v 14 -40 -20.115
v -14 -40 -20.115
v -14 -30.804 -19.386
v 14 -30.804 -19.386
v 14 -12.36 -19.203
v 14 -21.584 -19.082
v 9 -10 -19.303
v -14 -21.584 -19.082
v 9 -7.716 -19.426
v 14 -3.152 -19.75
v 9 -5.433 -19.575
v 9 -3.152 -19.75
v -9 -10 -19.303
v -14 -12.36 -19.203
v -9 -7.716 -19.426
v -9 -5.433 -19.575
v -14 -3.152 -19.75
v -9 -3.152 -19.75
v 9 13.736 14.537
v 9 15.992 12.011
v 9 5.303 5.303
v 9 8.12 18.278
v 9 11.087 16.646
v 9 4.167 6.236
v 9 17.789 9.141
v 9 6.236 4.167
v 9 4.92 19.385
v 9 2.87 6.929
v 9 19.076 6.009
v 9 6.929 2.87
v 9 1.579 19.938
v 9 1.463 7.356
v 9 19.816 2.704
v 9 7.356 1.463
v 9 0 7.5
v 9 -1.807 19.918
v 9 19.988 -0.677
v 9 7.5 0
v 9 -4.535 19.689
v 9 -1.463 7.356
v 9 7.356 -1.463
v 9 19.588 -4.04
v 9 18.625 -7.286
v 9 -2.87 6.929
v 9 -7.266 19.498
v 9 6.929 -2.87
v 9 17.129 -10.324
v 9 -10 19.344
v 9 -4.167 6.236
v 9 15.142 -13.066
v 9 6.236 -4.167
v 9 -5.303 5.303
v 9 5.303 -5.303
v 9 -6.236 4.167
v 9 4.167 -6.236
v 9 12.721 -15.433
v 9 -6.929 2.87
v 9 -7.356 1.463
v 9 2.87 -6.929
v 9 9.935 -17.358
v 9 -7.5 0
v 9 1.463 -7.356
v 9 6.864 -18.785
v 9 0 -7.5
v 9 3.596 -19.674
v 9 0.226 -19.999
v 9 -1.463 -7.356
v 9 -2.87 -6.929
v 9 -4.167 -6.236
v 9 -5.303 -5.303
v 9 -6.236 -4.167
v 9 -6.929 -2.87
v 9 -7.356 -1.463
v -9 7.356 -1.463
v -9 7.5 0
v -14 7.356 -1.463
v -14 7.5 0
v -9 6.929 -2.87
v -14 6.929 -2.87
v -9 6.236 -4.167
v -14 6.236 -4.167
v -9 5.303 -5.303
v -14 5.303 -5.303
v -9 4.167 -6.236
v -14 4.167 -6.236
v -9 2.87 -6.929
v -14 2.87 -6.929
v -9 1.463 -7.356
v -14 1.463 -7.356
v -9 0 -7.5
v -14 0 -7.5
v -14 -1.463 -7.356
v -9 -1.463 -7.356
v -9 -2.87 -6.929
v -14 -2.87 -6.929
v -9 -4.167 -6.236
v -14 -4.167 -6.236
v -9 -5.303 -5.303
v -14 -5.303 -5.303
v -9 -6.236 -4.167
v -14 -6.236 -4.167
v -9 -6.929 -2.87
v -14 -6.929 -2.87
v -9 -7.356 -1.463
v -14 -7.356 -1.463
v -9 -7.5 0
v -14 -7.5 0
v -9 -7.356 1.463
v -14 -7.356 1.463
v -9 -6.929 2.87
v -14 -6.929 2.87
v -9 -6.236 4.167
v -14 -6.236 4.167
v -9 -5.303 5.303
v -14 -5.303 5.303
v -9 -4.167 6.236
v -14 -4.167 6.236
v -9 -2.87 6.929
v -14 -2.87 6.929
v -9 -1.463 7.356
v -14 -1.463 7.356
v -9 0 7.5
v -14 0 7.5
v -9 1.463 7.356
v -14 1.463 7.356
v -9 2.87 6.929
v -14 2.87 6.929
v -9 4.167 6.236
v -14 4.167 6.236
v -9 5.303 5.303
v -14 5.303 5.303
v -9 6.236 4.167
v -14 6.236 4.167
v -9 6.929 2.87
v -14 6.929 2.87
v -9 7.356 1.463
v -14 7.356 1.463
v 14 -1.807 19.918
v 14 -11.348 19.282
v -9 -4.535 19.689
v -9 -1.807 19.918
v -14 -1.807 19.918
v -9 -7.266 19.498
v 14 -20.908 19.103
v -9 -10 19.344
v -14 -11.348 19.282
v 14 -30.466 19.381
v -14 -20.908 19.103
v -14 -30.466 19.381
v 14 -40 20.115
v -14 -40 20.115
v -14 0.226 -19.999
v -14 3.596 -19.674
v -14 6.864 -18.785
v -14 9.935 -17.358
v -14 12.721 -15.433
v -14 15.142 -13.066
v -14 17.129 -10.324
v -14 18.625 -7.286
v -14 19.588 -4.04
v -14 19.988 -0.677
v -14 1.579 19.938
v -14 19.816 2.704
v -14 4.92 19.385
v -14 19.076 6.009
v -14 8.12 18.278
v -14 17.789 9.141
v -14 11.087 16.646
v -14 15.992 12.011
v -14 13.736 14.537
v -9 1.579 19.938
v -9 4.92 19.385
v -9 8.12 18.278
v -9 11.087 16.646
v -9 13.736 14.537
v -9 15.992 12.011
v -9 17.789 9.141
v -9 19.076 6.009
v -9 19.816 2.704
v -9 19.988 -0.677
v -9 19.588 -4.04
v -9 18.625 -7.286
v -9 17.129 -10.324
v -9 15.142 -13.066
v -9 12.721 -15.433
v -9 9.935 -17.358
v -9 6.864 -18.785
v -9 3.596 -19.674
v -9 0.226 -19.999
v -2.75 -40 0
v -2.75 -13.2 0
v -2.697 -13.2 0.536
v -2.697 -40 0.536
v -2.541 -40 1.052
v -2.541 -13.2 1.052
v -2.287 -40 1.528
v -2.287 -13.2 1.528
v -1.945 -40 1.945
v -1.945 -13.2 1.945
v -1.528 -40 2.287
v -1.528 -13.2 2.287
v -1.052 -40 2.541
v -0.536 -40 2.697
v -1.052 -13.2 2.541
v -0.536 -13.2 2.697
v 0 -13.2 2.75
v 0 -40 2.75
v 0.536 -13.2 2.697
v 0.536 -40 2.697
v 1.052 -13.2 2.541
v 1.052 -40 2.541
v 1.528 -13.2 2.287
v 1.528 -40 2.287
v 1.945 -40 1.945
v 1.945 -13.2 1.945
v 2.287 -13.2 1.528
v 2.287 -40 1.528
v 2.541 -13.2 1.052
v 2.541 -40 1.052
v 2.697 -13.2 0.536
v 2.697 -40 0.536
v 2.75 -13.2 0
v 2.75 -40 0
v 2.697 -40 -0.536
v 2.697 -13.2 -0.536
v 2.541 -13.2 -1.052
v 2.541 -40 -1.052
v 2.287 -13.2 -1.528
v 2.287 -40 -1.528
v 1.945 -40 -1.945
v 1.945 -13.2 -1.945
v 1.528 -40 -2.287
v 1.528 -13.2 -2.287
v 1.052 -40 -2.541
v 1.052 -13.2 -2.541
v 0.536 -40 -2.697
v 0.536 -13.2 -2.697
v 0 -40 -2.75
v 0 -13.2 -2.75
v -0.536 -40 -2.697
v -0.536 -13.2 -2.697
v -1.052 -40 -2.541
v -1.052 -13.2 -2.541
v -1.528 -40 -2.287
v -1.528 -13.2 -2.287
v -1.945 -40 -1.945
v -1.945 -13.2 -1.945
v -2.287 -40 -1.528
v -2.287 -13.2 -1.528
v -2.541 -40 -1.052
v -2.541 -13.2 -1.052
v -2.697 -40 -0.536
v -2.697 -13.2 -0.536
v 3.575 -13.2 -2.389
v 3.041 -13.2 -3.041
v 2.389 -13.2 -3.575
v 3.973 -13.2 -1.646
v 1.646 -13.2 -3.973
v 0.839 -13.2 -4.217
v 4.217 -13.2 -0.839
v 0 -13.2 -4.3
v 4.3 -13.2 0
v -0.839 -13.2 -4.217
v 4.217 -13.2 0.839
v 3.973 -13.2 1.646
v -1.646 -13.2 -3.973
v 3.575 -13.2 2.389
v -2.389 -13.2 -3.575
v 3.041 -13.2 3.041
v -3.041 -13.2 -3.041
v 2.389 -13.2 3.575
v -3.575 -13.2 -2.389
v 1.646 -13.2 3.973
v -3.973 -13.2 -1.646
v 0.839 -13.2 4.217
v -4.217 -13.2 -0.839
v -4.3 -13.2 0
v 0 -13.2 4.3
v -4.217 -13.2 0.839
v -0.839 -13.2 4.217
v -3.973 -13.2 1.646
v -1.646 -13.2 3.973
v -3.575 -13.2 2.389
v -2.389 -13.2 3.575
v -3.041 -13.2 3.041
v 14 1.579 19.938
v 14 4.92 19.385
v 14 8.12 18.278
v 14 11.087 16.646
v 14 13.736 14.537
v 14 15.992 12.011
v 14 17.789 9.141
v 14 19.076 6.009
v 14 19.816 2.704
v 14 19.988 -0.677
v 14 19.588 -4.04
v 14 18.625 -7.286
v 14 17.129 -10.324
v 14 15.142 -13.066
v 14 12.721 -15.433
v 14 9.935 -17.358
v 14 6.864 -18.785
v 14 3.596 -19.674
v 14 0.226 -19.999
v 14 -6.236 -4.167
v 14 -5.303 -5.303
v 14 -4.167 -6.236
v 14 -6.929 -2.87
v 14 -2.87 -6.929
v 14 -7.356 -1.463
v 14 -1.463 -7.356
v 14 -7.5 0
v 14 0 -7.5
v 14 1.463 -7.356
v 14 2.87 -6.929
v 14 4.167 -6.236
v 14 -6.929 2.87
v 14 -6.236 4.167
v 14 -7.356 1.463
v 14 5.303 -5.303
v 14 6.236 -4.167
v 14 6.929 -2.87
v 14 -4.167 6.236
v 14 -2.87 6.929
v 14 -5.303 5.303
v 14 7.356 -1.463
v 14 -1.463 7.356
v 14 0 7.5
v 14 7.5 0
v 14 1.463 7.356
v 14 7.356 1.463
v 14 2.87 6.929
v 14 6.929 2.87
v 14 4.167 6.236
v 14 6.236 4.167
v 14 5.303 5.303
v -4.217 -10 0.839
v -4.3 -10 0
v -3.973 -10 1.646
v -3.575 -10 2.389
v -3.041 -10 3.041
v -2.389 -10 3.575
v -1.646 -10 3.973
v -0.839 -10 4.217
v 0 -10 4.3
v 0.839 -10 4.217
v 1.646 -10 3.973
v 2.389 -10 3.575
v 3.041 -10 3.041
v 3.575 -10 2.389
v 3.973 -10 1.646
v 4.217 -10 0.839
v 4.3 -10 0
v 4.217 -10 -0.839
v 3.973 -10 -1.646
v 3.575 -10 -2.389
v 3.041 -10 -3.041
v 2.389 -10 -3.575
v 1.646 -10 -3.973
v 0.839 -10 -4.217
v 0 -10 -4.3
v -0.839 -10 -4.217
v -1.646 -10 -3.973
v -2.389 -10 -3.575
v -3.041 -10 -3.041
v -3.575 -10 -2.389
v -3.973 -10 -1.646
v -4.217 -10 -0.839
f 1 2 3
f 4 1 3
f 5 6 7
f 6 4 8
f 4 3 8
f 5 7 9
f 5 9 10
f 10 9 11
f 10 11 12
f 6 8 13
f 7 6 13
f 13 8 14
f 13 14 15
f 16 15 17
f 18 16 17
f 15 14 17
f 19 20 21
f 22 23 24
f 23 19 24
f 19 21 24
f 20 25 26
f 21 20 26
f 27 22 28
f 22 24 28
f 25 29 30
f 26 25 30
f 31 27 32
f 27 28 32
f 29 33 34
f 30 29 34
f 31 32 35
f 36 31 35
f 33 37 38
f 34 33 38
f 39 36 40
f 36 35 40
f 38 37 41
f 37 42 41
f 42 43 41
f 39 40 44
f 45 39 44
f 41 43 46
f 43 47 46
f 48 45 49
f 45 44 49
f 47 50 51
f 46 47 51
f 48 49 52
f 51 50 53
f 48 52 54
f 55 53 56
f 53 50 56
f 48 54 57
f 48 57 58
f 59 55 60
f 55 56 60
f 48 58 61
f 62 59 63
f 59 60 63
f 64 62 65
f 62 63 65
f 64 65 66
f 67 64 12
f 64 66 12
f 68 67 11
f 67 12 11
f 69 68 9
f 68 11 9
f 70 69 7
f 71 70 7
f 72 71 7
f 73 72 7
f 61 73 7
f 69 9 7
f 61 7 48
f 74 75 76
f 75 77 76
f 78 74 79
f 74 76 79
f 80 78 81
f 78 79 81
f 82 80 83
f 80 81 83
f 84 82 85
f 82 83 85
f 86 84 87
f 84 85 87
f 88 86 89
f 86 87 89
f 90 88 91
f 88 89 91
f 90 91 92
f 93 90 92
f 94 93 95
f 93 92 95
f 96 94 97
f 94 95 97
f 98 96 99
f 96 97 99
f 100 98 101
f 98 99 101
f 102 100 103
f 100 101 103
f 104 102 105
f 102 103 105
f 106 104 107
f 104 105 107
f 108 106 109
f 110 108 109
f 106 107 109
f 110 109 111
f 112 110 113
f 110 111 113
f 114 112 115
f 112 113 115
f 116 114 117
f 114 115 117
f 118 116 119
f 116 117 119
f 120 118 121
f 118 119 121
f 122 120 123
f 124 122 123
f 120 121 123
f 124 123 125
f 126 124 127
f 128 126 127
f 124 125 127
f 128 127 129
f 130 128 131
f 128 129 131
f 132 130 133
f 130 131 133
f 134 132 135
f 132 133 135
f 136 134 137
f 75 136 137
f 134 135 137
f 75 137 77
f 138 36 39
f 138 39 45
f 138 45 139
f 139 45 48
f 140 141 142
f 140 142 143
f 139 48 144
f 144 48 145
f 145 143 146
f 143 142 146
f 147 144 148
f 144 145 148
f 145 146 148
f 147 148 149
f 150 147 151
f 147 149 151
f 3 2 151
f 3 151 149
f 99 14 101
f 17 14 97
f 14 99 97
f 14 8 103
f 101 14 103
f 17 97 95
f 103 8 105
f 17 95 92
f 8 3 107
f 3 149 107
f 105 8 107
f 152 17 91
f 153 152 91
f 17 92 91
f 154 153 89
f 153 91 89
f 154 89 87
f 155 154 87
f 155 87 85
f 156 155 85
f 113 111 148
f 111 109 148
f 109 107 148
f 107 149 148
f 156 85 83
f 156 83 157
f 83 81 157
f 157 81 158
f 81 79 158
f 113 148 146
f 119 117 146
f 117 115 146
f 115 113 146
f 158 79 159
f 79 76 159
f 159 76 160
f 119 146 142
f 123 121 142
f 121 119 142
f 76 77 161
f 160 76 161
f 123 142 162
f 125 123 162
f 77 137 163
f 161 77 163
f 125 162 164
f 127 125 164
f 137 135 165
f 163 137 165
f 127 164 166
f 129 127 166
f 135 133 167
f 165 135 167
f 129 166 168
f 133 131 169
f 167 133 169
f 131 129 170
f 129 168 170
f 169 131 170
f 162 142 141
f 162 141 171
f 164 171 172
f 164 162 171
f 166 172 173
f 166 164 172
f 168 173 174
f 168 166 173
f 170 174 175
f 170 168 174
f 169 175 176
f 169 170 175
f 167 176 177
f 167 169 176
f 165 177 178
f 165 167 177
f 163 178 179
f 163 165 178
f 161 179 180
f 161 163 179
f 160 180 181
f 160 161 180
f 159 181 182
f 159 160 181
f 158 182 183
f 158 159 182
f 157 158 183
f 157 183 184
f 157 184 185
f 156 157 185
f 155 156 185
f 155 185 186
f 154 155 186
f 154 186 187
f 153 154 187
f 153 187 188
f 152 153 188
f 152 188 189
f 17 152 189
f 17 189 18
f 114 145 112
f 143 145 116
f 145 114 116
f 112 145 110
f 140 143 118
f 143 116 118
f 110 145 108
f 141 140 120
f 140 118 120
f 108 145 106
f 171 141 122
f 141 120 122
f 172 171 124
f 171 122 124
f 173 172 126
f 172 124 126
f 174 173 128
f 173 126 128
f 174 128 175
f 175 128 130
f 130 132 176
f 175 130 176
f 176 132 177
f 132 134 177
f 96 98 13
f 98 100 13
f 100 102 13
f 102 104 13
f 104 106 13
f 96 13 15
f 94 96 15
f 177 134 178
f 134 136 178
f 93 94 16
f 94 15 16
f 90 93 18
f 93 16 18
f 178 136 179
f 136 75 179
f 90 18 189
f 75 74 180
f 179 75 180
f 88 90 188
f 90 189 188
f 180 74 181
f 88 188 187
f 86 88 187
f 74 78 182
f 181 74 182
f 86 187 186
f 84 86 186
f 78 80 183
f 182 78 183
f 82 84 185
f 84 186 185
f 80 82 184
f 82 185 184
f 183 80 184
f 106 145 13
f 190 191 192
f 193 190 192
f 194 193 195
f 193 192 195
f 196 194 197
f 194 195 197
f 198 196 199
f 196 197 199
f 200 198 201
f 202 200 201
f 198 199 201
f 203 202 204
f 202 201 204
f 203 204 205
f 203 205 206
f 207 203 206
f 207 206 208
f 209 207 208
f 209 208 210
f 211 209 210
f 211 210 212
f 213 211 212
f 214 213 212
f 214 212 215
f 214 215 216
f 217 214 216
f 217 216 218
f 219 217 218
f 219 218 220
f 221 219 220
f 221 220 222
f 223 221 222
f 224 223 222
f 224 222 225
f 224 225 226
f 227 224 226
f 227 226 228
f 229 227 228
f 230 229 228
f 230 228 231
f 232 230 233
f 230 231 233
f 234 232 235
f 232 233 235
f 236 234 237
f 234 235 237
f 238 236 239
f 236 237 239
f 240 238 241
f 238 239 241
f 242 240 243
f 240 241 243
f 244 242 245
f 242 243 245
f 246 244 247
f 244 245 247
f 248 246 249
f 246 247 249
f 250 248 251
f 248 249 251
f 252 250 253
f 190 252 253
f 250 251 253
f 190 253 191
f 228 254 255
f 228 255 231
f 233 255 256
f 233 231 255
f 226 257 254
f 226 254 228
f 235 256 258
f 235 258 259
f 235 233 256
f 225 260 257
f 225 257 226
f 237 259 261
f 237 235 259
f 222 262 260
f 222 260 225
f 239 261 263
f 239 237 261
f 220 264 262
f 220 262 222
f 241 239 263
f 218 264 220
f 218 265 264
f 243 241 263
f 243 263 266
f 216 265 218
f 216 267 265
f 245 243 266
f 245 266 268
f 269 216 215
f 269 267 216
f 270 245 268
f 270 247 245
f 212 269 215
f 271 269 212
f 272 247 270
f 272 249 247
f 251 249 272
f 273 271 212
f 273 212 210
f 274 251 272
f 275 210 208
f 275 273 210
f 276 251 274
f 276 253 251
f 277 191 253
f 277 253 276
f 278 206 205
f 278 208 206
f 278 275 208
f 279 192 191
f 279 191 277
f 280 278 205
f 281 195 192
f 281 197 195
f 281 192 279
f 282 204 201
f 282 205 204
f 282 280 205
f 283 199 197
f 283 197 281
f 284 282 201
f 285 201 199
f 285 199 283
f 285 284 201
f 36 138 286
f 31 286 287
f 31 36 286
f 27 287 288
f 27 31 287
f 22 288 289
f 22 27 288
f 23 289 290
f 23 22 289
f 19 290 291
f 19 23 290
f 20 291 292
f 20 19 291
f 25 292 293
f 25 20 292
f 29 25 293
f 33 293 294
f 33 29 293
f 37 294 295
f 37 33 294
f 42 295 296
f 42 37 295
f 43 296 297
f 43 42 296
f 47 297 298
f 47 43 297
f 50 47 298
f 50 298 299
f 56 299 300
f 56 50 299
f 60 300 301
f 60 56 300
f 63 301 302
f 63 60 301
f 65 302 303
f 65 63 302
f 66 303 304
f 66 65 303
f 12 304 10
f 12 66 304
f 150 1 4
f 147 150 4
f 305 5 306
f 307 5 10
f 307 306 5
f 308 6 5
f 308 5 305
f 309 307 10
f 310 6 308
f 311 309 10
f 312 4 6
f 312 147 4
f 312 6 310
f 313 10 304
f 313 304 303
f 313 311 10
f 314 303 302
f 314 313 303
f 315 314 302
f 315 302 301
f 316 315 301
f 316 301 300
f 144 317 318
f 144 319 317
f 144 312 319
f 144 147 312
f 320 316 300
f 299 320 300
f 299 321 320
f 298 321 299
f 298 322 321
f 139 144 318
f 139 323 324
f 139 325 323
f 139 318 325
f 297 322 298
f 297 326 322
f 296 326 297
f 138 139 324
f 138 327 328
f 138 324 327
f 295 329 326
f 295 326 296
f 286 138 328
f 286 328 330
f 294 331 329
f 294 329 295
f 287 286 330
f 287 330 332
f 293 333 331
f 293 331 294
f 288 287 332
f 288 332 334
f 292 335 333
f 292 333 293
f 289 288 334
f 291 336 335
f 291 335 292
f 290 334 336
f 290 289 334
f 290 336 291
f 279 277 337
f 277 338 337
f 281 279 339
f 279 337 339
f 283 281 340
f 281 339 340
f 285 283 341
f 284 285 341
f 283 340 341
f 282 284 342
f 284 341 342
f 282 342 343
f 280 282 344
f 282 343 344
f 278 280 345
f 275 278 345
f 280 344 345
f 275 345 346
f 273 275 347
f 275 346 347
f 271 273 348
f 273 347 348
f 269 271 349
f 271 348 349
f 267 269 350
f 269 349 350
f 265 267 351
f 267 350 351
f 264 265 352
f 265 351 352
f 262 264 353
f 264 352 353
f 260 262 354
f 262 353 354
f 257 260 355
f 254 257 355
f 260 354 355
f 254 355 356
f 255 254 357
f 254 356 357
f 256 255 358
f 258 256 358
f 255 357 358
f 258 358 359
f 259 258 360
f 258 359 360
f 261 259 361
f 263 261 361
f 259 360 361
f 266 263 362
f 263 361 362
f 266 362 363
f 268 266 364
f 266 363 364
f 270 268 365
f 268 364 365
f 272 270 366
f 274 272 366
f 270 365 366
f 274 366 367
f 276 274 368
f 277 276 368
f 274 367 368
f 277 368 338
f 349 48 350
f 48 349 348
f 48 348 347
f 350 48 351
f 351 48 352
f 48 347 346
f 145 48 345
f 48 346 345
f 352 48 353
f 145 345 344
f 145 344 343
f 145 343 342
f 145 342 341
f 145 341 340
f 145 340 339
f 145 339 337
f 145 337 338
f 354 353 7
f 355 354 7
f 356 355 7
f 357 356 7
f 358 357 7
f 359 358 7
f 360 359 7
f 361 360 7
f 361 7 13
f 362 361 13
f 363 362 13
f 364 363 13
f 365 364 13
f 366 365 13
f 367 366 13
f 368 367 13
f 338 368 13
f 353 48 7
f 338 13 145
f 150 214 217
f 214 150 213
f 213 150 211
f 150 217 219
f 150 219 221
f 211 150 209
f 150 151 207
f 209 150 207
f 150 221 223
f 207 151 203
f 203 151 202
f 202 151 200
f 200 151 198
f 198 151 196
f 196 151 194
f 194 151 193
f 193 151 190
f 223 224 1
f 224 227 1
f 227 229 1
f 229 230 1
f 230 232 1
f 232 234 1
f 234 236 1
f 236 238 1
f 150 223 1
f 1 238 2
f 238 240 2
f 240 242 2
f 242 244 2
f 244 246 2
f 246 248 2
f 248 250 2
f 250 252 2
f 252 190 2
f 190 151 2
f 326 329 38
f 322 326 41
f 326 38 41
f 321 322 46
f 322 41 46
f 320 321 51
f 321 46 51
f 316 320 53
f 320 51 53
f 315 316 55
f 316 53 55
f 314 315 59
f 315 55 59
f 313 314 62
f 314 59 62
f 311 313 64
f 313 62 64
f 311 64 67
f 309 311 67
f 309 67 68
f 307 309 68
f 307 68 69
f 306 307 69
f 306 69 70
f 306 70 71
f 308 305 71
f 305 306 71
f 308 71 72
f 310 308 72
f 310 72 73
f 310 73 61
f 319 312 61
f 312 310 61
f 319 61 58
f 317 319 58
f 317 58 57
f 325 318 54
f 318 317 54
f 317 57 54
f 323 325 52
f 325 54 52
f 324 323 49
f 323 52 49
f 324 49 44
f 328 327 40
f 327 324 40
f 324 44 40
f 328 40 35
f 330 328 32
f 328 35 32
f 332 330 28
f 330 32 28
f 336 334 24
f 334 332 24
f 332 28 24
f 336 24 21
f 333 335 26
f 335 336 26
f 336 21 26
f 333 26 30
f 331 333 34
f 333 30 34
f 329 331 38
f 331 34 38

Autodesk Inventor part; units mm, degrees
ref_plane "YZ Plane" through (0, 0, 0) normal (1, 0, 0) x (0, 1, 0)
ref_plane "XY Plane" through (0, 0, 0) normal (0, 0, 1) x (1, 0, 0)
sketch "Sketch1" plane through (0, 0, 0) normal (1, 0, 0) x (0, 1, 0)
  circle A0 centre (0, 0) radius 7.5
  arc A1 (-3.1515, -19.7501) -> (-1.8071, 19.9182) centre (0, 0) ccw
  line L0 (-40, 20.115) -> (-40, -20.115)
  arc A2 (-40, 20.115) -> (-1.8071, 19.9182) centre (-19.8777, 219.1002) ccw
  arc A3 (-3.1515, -19.7501) -> (-40, -20.115) centre (-19.6039, -219.0723) ccw
  point P0 (-40, 0)
  dimension "d6" = 15
  dimension "d7" = 40
  dimension "d30" = 40.23
  dimension "d31" = 40
  dimension "d32" = 200
  dimension "d33" = 200
  dimension "d34" = 438.1724
  dimension "d35" = 219.0723
extrude "Extrusion1" add sketch "Sketch1" along normal mid plane 28
sketch "Sketch3" plane through (0, 0, 0) normal (0, 0, 1) x (1, 0, 0)
  line L0 (-14, 20) -> (14, 20) construction
  line L1 (-14, -3.1515) -> (14, -3.1515) construction
  line L2 (14, -40) -> (14, -3.1515) construction
  line L3 (14, -40) -> (-14, -40) construction
  line L4 (-14, -3.1515) -> (-14, -40) construction
  line L5 (-9, 20) -> (9, 20)
  line L6 (9, 20) -> (9, -10)
  line L7 (9, -10) -> (-9, -10)
  line L8 (-9, -10) -> (-9, 20)
  point P0 (0, 0)
  point P1 (0, 20)
  point P2 (0, 20)
  dimension "d19" = 18
  dimension "d21" = 10
extrude "Extrusion3" cut sketch "Sketch3" along normal through all both and the other way through all
ref_plane "Work Plane1" through (0, -10, 0) normal (0, 1, 0) x (-1, 0, 0)
sketch "Sketch5" plane through (0, -10, 0) normal (0, 1, 0) x (-1, 0, 0)
  circle A0 centre (0, 0) radius 2.75
  circle A1 centre (0, 0) radius 4.3
  dimension "d37" = 5.5
  dimension "d38" = 8.6
extrude "Extrusion6" cut sketch "Sketch5" against normal blind 3.2 contours A0 | A1
extrude "Extrusion7" cut sketch "Sketch5" against normal through all contours A0
properties part number "cabeza_obj1"
